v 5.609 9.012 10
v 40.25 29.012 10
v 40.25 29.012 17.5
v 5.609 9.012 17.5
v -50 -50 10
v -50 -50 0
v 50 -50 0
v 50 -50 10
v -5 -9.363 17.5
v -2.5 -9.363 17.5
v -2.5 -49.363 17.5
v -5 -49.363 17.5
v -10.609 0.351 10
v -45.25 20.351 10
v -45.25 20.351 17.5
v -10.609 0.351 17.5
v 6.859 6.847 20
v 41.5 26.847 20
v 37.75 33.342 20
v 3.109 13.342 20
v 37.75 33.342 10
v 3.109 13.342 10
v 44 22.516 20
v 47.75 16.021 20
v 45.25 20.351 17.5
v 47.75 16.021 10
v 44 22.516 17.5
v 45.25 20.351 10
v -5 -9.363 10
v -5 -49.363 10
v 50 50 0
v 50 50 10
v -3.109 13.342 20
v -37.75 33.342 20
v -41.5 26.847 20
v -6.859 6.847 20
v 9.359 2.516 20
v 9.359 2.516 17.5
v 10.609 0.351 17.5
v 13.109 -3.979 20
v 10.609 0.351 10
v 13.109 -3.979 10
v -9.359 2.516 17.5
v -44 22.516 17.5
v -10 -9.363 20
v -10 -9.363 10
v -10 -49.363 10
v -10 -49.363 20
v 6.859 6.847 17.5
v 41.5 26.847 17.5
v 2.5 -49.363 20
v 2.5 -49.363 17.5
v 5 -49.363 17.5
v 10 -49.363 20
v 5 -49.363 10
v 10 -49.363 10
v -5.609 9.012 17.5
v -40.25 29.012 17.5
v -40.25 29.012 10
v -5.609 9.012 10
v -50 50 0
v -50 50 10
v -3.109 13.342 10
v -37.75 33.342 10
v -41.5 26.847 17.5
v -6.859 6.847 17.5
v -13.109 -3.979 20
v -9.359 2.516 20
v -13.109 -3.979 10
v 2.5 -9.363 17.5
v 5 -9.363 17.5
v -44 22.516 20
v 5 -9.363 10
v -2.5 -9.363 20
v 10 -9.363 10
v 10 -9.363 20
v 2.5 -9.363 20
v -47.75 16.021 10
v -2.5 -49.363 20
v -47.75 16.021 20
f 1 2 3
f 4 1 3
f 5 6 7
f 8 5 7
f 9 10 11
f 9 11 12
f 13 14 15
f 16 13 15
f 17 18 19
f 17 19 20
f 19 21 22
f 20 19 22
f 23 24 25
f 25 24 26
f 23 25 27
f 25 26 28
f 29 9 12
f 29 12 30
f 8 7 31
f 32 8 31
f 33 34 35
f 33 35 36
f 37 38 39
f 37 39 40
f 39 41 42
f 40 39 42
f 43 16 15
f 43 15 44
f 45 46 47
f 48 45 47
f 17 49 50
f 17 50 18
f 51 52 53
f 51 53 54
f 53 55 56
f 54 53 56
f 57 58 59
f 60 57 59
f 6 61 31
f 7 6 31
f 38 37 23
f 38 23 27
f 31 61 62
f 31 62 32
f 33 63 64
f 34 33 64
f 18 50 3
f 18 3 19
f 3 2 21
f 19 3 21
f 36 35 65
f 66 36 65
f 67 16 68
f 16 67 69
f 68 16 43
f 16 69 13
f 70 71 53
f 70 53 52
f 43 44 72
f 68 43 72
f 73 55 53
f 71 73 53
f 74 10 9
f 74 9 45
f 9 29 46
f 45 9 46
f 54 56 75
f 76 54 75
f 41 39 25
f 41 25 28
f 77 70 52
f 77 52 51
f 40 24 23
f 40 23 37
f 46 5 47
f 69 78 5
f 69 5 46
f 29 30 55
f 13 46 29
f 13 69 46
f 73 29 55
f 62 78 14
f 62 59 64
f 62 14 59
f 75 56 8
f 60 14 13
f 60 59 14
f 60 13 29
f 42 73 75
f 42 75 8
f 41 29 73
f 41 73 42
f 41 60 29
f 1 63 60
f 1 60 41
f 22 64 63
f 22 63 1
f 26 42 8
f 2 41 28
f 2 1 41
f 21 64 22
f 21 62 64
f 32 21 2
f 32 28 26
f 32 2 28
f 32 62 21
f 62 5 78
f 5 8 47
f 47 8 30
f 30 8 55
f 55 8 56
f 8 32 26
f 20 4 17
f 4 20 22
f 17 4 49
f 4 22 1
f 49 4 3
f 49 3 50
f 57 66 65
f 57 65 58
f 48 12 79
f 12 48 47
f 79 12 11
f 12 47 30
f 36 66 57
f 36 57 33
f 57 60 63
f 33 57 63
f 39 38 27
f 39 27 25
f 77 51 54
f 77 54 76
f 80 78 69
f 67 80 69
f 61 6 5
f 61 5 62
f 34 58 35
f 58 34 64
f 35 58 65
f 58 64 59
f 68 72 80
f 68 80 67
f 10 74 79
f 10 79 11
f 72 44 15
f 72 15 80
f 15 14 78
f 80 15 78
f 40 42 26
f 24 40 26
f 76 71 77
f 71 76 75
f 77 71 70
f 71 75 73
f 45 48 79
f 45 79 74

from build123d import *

# Parameters (mm, degrees)
SKETCH1_W           = 100
SKETCH1_H           = 100
BOSS_EXTRUDE1_DEPTH = 10
BOSS_EXTRUDE2_DEPTH = 10
CUT_EXTRUDE1_DEPTH  = 83.259731469
CIRPATTERN6_COUNT   = 3


with BuildPart() as part:
    # Sketch1 → Boss-Extrude1 (new body)
    with BuildSketch(Plane.XY):
        Rectangle(SKETCH1_W, SKETCH1_H)
    extrude(amount=BOSS_EXTRUDE1_DEPTH)

    # Sketch2 → Boss-Extrude2 (add)
    with BuildSketch(Plane.XY.offset(10)):
        Polygon((-47.749545474, 16.021207549), (-13.108529323, -3.978792451), (-3.108529323, 13.341715625), (-37.749545474, 33.341715625), align=None)
    boss_extrude2 = extrude(amount=BOSS_EXTRUDE2_DEPTH)

    # Sketch3 → Cut-Extrude1 (cut, through all)
    with BuildSketch(Plane(origin=(-8.108529323, 4.681461587, 0), x_dir=(0, 0, -1), z_dir=(0.8660254037844387, -0.4999999999999998, 0))):
        Polygon((-17.5, 5), (-10, 5), (-10, -5), (-17.5, -5), (-17.5, -2.5), (-20, -2.5), (-20, 2.5), (-17.5, 2.5), align=None)
    cut_extrude1 = extrude(amount=-CUT_EXTRUDE1_DEPTH, mode=Mode.SUBTRACT)

    # CirPattern6: Boss-Extrude2, Cut-Extrude1 ×3 about axis
    cirpattern6_axis = Axis((0, 0, 0), (0, 0, 1))
    add([boss_extrude2.rotate(cirpattern6_axis, i * 360 / CIRPATTERN6_COUNT) for i in range(1, CIRPATTERN6_COUNT)])
    add([cut_extrude1.rotate(cirpattern6_axis, i * 360 / CIRPATTERN6_COUNT) for i in range(1, CIRPATTERN6_COUNT)], mode=Mode.SUBTRACT)


solid = part.part
